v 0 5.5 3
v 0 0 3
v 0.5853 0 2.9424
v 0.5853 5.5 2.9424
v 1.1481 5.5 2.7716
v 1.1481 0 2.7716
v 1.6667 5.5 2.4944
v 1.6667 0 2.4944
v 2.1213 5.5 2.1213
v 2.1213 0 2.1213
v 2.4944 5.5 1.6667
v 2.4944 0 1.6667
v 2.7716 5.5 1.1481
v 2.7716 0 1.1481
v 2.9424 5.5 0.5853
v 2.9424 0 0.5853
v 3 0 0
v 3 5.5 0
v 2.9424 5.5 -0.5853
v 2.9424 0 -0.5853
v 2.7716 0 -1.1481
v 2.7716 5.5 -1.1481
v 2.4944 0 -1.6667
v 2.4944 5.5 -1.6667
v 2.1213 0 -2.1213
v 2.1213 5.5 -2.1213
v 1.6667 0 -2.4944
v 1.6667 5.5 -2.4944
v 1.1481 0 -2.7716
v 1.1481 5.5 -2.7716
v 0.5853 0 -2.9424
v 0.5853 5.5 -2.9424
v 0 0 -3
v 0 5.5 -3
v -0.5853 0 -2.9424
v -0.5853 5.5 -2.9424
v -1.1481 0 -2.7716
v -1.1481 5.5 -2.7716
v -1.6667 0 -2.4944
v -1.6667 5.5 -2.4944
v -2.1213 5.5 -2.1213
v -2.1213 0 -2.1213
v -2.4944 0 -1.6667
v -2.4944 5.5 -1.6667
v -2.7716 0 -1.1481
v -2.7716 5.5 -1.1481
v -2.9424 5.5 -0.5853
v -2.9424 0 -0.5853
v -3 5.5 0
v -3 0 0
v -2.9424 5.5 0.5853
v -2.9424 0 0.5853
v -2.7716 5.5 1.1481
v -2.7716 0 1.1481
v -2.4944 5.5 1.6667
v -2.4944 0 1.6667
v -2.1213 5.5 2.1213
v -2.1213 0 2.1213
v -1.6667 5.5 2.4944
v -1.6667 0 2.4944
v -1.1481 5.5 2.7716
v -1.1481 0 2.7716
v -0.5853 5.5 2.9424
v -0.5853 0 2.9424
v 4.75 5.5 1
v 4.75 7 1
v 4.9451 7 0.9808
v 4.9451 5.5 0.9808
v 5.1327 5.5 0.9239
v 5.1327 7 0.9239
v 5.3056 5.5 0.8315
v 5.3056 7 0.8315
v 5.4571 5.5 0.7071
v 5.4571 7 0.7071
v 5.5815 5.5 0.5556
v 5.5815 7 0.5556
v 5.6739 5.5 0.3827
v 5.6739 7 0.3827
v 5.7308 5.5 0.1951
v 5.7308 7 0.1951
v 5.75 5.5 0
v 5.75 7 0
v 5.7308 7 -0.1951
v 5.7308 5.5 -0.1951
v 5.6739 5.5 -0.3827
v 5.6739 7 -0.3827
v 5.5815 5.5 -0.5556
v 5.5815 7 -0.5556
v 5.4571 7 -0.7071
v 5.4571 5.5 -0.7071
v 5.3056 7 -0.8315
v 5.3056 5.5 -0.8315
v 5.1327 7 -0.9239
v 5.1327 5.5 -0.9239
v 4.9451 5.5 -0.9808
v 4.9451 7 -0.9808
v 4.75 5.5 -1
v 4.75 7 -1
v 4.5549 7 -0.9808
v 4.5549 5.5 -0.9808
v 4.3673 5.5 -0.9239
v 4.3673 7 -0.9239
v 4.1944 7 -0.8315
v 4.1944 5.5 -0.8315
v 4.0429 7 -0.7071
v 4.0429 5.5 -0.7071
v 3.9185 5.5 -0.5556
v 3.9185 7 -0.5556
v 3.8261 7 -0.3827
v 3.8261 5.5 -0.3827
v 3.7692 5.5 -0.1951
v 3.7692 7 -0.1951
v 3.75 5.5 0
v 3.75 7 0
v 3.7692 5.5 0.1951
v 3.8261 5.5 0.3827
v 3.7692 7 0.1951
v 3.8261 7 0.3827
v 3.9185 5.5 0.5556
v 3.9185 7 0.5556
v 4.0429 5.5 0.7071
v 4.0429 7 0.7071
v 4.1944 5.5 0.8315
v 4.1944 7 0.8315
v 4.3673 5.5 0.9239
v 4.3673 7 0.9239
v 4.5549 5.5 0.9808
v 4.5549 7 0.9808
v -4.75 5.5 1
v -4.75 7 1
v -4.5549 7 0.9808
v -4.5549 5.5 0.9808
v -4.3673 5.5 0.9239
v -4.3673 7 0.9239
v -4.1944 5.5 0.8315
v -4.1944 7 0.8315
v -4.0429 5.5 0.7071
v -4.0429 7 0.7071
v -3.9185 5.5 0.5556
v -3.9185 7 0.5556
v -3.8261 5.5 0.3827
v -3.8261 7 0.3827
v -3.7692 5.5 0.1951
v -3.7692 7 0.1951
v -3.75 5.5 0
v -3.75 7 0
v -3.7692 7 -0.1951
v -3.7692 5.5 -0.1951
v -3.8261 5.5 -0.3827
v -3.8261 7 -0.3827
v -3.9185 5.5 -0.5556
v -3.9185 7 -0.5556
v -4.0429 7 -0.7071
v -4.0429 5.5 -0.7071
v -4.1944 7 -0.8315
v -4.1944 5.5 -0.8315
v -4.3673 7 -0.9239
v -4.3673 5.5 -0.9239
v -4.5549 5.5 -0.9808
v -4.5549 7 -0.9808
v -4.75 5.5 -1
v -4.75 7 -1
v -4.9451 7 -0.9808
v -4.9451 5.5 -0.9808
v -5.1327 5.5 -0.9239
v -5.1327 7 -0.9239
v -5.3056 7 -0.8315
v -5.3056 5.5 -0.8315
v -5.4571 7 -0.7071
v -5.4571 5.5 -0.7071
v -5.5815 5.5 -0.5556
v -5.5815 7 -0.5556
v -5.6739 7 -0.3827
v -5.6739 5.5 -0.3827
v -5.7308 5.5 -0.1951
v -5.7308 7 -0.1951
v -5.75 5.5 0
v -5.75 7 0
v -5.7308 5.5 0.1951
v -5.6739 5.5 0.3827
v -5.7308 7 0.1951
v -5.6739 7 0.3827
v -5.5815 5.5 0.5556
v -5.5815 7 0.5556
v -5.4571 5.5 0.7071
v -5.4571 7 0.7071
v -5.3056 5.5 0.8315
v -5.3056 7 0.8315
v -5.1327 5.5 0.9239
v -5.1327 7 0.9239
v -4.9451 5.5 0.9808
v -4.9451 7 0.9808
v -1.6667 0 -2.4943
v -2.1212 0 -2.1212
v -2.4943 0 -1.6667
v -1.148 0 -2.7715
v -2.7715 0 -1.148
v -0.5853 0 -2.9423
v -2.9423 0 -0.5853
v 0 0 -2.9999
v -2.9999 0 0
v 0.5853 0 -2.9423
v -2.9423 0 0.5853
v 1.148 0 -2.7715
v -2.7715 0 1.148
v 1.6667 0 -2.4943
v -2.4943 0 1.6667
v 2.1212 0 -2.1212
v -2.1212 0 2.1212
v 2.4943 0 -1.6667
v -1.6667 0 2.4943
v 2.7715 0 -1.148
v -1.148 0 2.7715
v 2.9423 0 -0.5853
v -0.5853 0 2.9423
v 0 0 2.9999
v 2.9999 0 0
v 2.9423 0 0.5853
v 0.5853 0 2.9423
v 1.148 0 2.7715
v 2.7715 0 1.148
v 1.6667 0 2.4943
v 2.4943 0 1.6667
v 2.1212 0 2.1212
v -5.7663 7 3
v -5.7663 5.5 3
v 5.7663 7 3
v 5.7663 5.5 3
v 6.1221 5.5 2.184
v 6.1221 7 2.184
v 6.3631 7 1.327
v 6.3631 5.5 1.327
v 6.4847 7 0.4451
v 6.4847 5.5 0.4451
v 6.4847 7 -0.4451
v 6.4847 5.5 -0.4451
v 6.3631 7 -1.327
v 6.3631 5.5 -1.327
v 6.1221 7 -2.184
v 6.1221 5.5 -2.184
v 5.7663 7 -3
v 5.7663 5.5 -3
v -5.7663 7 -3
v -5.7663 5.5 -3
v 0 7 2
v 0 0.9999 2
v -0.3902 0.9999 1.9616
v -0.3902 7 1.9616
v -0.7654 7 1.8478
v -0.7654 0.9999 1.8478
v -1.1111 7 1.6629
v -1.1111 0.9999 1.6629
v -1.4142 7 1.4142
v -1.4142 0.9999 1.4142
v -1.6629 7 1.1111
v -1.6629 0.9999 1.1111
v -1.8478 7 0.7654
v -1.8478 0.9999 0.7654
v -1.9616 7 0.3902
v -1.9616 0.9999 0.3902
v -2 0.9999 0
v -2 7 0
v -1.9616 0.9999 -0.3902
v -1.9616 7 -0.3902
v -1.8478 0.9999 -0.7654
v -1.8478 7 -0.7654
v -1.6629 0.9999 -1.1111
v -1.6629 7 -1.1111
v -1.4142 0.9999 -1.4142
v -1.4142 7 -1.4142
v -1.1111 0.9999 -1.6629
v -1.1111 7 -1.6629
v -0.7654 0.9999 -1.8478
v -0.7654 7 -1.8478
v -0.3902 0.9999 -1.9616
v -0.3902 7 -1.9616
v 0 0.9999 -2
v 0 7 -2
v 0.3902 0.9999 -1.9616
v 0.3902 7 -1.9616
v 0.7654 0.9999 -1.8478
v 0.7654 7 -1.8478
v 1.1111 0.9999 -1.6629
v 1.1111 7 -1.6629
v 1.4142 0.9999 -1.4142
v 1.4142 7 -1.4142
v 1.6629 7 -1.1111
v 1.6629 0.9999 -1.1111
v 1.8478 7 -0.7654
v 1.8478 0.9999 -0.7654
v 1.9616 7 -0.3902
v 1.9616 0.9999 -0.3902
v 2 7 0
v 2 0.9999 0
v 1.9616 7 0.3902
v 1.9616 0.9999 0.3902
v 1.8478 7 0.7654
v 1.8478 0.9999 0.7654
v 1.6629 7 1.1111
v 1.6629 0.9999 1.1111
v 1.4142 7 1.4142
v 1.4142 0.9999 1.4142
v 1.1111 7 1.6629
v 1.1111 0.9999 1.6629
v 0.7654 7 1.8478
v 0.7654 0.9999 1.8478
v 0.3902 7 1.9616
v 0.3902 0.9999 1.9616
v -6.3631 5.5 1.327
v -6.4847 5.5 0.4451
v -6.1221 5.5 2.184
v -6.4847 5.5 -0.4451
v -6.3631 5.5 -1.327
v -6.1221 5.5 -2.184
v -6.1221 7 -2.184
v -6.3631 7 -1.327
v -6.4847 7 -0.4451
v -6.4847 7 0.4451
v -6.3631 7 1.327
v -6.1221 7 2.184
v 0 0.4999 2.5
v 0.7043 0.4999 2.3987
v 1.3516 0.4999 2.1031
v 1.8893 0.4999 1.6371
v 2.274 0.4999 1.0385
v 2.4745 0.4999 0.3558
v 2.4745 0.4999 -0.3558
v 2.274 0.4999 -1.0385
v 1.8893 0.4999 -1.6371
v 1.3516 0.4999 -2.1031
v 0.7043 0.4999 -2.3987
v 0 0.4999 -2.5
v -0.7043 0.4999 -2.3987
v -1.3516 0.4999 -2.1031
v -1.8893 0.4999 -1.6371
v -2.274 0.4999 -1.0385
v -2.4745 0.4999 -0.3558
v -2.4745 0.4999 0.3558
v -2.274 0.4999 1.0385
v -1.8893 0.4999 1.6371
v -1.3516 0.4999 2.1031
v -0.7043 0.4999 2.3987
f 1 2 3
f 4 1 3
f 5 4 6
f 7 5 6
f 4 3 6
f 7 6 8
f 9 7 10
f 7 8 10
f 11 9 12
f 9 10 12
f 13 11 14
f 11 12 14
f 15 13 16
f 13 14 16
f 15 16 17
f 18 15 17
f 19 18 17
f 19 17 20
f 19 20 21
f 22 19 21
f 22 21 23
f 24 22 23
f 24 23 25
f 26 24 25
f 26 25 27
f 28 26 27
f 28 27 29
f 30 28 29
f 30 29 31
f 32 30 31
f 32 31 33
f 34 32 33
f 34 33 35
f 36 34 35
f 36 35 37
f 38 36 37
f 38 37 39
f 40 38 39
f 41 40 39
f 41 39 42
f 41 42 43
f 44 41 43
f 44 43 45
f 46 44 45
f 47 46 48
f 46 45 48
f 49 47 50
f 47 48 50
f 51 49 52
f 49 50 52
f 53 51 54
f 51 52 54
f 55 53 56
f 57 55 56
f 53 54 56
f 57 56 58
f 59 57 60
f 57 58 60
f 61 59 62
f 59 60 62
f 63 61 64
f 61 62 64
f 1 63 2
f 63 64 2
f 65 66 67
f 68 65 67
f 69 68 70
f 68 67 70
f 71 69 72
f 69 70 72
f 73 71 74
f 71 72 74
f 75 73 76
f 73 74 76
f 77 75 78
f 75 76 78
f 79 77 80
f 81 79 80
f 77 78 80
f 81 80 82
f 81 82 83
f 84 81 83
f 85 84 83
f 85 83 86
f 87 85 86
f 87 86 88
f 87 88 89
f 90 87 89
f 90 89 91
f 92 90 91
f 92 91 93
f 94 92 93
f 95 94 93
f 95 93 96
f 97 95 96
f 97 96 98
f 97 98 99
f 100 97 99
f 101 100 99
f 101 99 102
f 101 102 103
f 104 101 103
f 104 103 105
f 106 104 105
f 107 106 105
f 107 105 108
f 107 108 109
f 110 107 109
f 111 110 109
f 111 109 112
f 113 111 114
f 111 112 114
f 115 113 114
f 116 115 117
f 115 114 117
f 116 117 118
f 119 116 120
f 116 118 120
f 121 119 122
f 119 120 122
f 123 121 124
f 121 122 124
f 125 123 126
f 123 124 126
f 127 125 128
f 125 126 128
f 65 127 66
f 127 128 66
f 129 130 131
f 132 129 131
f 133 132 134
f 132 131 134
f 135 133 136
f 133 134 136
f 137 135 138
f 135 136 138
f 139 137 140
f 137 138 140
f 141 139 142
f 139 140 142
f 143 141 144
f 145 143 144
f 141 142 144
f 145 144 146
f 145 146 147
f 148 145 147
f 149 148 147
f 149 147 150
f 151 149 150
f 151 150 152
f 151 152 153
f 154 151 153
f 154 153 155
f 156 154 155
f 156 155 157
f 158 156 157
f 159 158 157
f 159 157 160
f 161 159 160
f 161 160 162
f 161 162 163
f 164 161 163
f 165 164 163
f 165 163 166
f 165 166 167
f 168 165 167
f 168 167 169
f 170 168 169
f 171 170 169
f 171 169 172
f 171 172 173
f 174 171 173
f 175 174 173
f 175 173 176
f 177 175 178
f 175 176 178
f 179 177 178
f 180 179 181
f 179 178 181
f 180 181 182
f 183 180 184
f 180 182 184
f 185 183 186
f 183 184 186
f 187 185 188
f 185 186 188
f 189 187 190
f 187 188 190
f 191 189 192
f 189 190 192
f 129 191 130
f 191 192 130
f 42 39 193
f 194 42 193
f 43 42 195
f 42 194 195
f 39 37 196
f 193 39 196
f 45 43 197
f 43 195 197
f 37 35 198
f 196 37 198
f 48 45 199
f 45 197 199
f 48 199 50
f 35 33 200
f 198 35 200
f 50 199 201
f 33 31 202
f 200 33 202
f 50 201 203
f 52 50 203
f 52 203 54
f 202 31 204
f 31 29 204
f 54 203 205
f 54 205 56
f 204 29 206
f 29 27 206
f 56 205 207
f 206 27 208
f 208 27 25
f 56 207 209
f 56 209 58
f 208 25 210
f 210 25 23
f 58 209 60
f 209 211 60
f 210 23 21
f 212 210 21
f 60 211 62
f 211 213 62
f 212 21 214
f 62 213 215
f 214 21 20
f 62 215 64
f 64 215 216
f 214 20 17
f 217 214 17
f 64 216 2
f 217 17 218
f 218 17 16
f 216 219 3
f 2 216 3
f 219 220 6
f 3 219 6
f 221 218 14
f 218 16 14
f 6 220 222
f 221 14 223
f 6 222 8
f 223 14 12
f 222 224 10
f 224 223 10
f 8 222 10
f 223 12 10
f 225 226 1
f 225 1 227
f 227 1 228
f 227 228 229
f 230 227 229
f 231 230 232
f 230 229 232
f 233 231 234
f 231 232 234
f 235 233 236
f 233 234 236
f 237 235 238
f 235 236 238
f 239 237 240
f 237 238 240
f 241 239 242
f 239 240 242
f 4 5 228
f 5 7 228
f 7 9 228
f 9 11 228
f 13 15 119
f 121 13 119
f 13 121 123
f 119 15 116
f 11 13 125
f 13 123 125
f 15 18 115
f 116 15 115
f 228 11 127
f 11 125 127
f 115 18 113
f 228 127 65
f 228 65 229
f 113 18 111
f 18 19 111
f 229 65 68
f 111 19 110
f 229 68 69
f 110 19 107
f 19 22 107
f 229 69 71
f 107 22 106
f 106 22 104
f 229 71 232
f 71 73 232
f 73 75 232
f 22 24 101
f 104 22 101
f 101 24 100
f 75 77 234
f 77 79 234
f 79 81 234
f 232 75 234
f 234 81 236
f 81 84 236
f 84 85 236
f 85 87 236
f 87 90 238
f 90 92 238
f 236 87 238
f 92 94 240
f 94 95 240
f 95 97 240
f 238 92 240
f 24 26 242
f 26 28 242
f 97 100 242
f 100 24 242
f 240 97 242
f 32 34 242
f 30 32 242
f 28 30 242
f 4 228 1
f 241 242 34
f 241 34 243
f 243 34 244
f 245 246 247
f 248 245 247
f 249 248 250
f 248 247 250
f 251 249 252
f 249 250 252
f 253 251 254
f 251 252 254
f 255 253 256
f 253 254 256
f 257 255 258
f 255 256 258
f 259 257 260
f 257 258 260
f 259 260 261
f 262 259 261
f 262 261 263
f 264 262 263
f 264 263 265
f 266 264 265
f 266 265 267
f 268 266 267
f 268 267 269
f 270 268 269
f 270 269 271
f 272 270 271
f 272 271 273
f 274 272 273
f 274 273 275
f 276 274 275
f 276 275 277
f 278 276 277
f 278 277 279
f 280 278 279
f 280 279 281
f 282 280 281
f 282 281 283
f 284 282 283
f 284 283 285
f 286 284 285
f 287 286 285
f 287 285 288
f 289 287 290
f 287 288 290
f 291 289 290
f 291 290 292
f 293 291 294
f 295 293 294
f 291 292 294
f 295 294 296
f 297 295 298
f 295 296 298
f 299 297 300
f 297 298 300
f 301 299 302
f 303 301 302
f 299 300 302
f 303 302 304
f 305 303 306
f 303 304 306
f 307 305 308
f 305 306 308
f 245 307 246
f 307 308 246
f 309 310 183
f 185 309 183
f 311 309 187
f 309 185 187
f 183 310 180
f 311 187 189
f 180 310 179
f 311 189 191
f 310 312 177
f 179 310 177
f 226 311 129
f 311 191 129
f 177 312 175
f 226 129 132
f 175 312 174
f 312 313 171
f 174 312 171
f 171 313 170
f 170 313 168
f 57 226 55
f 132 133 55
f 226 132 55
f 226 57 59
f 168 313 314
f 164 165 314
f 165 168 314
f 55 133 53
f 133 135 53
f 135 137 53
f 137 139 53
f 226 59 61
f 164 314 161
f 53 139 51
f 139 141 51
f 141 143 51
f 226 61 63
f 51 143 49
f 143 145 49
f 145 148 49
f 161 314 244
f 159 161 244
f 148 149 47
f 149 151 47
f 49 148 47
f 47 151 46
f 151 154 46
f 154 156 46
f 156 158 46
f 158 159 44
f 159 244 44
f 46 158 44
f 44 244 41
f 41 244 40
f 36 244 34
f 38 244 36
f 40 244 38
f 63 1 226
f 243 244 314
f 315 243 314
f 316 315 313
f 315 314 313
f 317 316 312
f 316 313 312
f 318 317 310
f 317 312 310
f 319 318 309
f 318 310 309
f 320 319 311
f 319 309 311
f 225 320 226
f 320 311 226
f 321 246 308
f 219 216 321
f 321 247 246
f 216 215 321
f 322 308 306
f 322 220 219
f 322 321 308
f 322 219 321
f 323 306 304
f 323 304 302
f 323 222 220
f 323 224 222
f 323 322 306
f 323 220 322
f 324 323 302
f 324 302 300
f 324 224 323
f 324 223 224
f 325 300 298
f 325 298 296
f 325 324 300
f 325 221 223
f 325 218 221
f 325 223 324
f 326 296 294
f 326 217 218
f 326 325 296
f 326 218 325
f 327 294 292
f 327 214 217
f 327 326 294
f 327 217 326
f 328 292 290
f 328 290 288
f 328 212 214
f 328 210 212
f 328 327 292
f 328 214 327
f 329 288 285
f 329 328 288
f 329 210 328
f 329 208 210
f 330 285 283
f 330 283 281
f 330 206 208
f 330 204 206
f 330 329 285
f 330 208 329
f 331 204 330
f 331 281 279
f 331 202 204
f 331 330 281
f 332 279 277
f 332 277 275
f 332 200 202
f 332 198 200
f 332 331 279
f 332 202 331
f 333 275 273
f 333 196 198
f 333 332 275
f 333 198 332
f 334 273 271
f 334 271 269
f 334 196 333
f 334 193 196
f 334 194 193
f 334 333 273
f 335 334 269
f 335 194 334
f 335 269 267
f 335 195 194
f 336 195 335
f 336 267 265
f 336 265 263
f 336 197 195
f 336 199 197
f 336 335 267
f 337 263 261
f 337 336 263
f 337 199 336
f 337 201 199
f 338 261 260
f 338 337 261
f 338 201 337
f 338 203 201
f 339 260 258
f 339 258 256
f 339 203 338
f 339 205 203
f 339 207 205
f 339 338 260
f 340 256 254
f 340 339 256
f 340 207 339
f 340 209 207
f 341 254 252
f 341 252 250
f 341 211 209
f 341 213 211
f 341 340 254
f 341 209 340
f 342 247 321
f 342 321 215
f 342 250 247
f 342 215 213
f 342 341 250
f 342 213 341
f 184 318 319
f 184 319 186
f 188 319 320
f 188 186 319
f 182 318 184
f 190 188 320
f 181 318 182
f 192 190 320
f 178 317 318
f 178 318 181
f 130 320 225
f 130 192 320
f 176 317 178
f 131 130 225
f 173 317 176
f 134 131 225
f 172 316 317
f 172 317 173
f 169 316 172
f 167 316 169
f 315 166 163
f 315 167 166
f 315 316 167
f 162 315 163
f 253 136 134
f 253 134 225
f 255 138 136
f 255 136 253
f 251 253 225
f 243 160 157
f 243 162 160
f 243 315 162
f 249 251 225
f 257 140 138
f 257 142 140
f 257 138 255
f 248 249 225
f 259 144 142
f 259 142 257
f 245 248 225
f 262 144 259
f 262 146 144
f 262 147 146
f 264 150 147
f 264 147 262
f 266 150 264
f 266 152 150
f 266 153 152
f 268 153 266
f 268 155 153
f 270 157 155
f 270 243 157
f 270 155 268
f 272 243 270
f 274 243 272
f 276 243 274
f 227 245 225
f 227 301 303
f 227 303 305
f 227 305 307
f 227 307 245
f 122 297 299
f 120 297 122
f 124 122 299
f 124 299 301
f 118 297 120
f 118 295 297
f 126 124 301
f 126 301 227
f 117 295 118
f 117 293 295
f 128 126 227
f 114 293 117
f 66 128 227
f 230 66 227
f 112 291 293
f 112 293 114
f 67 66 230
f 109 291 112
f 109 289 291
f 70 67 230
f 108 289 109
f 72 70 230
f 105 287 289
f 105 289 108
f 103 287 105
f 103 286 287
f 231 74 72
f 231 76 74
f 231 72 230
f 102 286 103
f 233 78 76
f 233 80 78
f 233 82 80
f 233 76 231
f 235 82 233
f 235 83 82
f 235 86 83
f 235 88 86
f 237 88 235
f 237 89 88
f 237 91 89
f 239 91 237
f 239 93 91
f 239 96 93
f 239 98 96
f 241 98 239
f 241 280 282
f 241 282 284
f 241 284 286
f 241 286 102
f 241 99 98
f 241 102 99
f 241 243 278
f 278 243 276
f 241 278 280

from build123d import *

# Parameters (mm, degrees)
SKETCH1_R           = 3
SKETCH1_R_2         = 2
BOSS_EXTRUDE1_DEPTH = 5.5
BOSS_EXTRUDE2_DEPTH = 1.5
SKETCH3_R           = 2
CUT_EXTRUDE1_DEPTH  = 11.5
SKETCH4_R           = 1
CUT_EXTRUDE2_DEPTH  = 11.5
CHAMFER1_SIZE       = 1


with BuildPart() as part:
    # Sketch1 → Boss-Extrude1 (new body)
    with BuildSketch(Plane(origin=(0, 0, 0), x_dir=(1, 0, 0), z_dir=(0, 1, 0))):
        with Locations(Location((0, 0, 0), (0, 0, 270))):
            Circle(SKETCH1_R)
        with Locations(Location((0, 0, 0), (0, 0, 270))):
            Circle(SKETCH1_R_2, mode=Mode.SUBTRACT)
    extrude(amount=BOSS_EXTRUDE1_DEPTH)

    # Sketch2 → Boss-Extrude2 (add)
    with BuildSketch(Plane(origin=(0, 5.5, 0), x_dir=(1, 0, 0), z_dir=(0, 1, 0))):
        with BuildLine():
            Line((5.766281297, 3), (-5.766281297, 3))
            ThreePointArc((-5.766281297, 3), (-6.5, 0), (-5.766281297, -3))
            Line((-5.766281297, -3), (5.766281297, -3))
            ThreePointArc((5.766281297, -3), (6.5, 0), (5.766281297, 3))
        make_face()
    extrude(amount=BOSS_EXTRUDE2_DEPTH)

    # Sketch3 → Cut-Extrude1 (cut)
    with BuildSketch(Plane.XZ.offset(-5.5)):
        with Locations(Location((0, 0, 0), (0, 0, 90))):
            Circle(SKETCH3_R)
    extrude(amount=-CUT_EXTRUDE1_DEPTH, mode=Mode.SUBTRACT)

    # Sketch4 → Cut-Extrude2 (cut)
    with BuildSketch(Plane(origin=(0, 7, 0), x_dir=(1, 0, 0), z_dir=(0, 1, 0))):
        with Locations(Location((-4.75, 0, 0), (0, 0, 270))):
            Circle(SKETCH4_R)
        with Locations(Location((4.75, 0, 0), (0, 0, 270))):
            Circle(SKETCH4_R)
    extrude(amount=-CUT_EXTRUDE2_DEPTH, mode=Mode.SUBTRACT)

    # Chamfer1
    chamfer1_edges = [part.edges().sort_by_distance(p)[0] for p in [
        (0, 0, -2),
    ]]
    chamfer(chamfer1_edges, length=CHAMFER1_SIZE - 0.0001)  # a hair under: the kernel refuses the full size


solid = part.part
